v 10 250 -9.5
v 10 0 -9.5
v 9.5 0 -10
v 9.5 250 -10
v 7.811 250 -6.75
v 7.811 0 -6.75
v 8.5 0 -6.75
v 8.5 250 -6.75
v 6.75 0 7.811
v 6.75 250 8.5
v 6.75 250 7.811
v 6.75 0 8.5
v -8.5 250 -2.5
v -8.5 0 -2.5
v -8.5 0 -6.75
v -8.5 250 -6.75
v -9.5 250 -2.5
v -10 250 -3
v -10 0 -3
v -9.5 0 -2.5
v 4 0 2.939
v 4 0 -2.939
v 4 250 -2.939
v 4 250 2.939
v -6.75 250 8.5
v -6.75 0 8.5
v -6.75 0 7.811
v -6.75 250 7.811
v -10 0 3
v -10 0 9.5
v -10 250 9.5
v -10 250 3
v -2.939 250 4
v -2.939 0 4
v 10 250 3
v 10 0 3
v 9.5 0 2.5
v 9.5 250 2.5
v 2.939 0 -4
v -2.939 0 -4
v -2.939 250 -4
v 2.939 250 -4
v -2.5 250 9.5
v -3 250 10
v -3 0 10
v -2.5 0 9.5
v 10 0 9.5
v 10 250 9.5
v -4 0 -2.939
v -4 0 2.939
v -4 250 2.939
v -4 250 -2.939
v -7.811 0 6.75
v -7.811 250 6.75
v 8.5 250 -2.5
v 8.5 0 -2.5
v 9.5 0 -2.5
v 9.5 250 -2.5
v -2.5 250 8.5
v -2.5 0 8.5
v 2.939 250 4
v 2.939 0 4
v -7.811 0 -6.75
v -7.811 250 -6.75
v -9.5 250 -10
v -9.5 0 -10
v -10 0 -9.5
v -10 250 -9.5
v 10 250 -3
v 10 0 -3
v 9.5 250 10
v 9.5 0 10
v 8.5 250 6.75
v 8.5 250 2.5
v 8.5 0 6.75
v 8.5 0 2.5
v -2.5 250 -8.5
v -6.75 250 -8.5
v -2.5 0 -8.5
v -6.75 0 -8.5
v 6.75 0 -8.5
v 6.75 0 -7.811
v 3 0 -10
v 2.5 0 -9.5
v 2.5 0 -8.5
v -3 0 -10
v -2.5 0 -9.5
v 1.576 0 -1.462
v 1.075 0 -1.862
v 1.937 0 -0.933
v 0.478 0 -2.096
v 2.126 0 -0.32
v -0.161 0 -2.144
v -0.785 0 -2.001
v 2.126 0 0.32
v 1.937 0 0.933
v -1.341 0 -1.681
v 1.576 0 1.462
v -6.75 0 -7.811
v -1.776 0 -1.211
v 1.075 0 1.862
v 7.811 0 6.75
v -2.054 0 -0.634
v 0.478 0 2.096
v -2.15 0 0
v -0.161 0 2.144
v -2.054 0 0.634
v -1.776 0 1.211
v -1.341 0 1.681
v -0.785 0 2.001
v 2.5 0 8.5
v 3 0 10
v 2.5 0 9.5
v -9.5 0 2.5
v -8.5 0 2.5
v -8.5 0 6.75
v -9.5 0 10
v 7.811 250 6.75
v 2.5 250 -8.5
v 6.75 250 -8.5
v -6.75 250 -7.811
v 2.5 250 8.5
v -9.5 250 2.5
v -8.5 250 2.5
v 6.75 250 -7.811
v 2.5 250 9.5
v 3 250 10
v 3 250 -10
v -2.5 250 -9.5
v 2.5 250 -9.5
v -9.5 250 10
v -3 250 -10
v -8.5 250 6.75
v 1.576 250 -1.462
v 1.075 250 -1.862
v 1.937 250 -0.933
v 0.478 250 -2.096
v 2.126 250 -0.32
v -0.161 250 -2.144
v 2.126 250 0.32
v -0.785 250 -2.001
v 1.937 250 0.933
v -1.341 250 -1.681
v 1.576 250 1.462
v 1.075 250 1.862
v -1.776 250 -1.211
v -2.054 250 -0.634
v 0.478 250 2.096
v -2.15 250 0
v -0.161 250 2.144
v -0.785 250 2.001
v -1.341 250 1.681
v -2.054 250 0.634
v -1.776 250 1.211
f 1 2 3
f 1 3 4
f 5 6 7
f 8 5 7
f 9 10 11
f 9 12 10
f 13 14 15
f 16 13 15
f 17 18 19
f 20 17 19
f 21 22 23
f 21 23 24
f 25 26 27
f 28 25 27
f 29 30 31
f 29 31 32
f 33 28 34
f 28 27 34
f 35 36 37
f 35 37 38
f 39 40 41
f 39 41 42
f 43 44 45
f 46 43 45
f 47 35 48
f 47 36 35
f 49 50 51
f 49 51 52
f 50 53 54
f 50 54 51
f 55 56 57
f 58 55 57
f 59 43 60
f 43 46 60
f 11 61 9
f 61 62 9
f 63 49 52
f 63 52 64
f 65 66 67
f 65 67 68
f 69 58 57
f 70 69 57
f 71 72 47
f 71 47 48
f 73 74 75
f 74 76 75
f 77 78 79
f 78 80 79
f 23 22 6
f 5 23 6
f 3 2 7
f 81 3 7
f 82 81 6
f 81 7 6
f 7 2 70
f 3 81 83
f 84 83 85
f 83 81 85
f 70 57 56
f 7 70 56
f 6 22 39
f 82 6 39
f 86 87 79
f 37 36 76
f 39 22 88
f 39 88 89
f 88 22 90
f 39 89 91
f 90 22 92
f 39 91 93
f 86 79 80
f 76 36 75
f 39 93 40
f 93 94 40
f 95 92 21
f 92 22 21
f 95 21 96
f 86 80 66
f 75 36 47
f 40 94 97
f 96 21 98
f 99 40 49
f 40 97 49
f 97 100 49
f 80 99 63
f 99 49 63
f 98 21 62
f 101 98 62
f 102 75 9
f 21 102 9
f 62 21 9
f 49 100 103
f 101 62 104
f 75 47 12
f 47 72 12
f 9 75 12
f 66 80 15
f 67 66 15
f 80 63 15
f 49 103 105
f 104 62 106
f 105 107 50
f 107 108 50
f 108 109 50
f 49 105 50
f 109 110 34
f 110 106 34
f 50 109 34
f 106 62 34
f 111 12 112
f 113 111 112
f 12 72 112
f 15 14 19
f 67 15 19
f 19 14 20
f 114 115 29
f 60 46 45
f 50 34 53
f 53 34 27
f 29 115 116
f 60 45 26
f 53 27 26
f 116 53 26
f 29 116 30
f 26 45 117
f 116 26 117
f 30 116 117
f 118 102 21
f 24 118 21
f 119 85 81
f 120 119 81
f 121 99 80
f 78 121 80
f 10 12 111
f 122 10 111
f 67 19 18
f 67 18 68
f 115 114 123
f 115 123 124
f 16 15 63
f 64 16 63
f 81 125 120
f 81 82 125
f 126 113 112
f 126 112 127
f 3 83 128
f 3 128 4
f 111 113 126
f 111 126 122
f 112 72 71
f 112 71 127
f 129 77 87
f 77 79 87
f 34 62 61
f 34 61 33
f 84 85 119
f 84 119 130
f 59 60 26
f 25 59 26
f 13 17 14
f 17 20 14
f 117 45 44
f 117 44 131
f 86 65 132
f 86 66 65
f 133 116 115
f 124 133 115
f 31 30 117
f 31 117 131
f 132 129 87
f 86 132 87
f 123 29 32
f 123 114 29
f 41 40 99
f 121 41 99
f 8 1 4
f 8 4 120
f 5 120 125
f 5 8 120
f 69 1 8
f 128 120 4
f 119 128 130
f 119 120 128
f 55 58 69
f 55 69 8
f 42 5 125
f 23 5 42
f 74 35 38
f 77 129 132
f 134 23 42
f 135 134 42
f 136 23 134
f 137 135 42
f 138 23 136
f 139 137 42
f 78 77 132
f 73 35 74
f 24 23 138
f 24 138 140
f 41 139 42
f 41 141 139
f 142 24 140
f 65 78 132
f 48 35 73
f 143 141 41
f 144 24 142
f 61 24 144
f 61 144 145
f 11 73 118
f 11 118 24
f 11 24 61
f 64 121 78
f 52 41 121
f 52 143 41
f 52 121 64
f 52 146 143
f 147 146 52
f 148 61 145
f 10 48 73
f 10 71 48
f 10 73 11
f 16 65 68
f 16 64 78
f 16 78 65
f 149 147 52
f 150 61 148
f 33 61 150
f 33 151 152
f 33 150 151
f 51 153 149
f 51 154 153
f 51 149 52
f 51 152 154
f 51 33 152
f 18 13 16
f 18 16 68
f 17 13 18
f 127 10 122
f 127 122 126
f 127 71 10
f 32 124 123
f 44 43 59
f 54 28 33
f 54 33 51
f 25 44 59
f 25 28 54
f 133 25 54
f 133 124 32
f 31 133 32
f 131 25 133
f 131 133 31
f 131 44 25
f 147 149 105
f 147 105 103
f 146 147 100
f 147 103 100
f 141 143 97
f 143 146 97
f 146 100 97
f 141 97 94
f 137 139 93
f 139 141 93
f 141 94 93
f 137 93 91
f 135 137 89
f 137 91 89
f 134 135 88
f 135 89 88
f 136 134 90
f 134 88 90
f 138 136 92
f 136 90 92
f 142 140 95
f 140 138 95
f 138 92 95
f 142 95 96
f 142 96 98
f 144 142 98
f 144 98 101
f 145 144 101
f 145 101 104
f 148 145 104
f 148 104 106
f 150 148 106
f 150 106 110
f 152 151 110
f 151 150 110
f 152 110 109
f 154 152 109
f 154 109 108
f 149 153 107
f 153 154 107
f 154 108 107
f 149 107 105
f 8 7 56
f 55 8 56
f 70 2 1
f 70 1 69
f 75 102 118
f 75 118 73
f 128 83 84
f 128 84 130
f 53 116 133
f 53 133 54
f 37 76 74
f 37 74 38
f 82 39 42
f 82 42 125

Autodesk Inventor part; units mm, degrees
ref_plane "YZ Plane" through (0, 0, 0) normal (1, 0, 0) x (0, 1, 0)
ref_plane "XZ Plane" through (0, 0, 0) normal (0, 1, 0) x (-1, 0, 0)
ref_plane "XY Plane" through (0, 0, 0) normal (0, 0, 1) x (1, 0, 0)
sketch "Sketch1" plane through (0, 0, 0) normal (0, 1, 0) x (-1, 0, 0)
  line L0 (-2.9393, 4) -> (2.9393, 4)
  line L1 (4, 2.9393) -> (4, -2.9393)
  line L2 (2.9393, -4) -> (-2.9393, -4)
  line L3 (-4, -2.9393) -> (-4, 2.9393)
  circle A0 centre (0, 0) radius 2.15
  line L4 (-2.9393, 4) -> (-6.75, 7.8107)
  line L5 (-7.8107, 6.75) -> (-4, 2.9393)
  line L6 (4, -2.9393) -> (7.8107, -6.75)
  line L7 (-10, 10) -> (-2.5, 10)
  line L8 (2.5, 10) -> (10, 10)
  line L9 (10, -10) -> (2.5, -10)
  line L10 (-2.5, -10) -> (-10, -10)
  line L11 (10, 10) -> (10, 2.5)
  line L12 (10, -2.5) -> (10, -10)
  line L13 (-10, -10) -> (-10, -2.5)
  line L14 (-10, 2.5) -> (-10, 10)
  line L15 (-8.5, 2.5) -> (-8.5, 6.75)
  line L16 (-6.75, 8.5) -> (-2.5, 8.5)
  line L17 (2.5, 10) -> (2.5, 8.5)
  line L18 (10, 2.5) -> (8.5, 2.5)
  line L19 (10, -2.5) -> (8.5, -2.5)
  line L20 (2.5, -8.5) -> (2.5, -10)
  line L21 (-2.5, -8.5) -> (-2.5, -10)
  line L22 (-8.5, -2.5) -> (-10, -2.5)
  line L23 (-8.5, 2.5) -> (-10, 2.5)
  line L24 (-2.5, 10) -> (-2.5, 8.5)
  line L25 (-7.8107, 6.75) -> (-8.5, 6.75)
  line L26 (-6.75, 8.5) -> (-6.75, 7.8107)
  line L27 (6.75, 8.5) -> (6.75, 7.8107)
  line L28 (8.5, 6.75) -> (7.8107, 6.75)
  line L29 (8.5, 6.75) -> (8.5, 2.5)
  line L30 (2.5, 8.5) -> (6.75, 8.5)
  line L31 (6.75, 7.8107) -> (2.9393, 4)
  line L32 (7.8107, 6.75) -> (4, 2.9393)
  line L33 (2.9393, -4) -> (6.75, -7.8107)
  line L34 (8.5, -2.5) -> (8.5, -6.75)
  line L35 (6.75, -8.5) -> (2.5, -8.5)
  line L36 (8.5, -6.75) -> (7.8107, -6.75)
  line L37 (6.75, -7.8107) -> (6.75, -8.5)
  line L38 (-2.5, -8.5) -> (-6.75, -8.5)
  line L39 (-2.9393, -4) -> (-6.75, -7.8107)
  line L40 (-8.5, -6.75) -> (-8.5, -2.5)
  line L41 (-4, -2.9393) -> (-7.8107, -6.75)
  line L42 (-6.75, -7.8107) -> (-6.75, -8.5)
  line L43 (-7.8107, -6.75) -> (-8.5, -6.75)
  dimension "d0" = 20
  dimension "d1" = 20
  dimension "d26" = 1.5
  dimension "d27" = 1.5
  dimension "d32" = 7.5
  dimension "d33" = 5
  dimension "d34" = 7.5
  dimension "d35" = 7.5
  dimension "d40" = 6
  dimension "d41" = 13.5
extrude "Extrusion1" add sketch "Sketch1" along normal blind 250
chamfer "Chamfer1" distance 0.5 angle 45 12 edges at (-10, 125, 2.5) (-10, 125, -2.5) (-2.5, 125, 10) (2.5, 125, 10) (10, 125, 2.5) (10, 125, -2.5) (2.5, 125, -10) (-2.5, 125, -10) (-10, 125, 10) (-10, 125, -10) (10, 125, -10) (10, 125, 10)
properties part number "2020 Extrusion 250mm" material "Aluminum 6061"
